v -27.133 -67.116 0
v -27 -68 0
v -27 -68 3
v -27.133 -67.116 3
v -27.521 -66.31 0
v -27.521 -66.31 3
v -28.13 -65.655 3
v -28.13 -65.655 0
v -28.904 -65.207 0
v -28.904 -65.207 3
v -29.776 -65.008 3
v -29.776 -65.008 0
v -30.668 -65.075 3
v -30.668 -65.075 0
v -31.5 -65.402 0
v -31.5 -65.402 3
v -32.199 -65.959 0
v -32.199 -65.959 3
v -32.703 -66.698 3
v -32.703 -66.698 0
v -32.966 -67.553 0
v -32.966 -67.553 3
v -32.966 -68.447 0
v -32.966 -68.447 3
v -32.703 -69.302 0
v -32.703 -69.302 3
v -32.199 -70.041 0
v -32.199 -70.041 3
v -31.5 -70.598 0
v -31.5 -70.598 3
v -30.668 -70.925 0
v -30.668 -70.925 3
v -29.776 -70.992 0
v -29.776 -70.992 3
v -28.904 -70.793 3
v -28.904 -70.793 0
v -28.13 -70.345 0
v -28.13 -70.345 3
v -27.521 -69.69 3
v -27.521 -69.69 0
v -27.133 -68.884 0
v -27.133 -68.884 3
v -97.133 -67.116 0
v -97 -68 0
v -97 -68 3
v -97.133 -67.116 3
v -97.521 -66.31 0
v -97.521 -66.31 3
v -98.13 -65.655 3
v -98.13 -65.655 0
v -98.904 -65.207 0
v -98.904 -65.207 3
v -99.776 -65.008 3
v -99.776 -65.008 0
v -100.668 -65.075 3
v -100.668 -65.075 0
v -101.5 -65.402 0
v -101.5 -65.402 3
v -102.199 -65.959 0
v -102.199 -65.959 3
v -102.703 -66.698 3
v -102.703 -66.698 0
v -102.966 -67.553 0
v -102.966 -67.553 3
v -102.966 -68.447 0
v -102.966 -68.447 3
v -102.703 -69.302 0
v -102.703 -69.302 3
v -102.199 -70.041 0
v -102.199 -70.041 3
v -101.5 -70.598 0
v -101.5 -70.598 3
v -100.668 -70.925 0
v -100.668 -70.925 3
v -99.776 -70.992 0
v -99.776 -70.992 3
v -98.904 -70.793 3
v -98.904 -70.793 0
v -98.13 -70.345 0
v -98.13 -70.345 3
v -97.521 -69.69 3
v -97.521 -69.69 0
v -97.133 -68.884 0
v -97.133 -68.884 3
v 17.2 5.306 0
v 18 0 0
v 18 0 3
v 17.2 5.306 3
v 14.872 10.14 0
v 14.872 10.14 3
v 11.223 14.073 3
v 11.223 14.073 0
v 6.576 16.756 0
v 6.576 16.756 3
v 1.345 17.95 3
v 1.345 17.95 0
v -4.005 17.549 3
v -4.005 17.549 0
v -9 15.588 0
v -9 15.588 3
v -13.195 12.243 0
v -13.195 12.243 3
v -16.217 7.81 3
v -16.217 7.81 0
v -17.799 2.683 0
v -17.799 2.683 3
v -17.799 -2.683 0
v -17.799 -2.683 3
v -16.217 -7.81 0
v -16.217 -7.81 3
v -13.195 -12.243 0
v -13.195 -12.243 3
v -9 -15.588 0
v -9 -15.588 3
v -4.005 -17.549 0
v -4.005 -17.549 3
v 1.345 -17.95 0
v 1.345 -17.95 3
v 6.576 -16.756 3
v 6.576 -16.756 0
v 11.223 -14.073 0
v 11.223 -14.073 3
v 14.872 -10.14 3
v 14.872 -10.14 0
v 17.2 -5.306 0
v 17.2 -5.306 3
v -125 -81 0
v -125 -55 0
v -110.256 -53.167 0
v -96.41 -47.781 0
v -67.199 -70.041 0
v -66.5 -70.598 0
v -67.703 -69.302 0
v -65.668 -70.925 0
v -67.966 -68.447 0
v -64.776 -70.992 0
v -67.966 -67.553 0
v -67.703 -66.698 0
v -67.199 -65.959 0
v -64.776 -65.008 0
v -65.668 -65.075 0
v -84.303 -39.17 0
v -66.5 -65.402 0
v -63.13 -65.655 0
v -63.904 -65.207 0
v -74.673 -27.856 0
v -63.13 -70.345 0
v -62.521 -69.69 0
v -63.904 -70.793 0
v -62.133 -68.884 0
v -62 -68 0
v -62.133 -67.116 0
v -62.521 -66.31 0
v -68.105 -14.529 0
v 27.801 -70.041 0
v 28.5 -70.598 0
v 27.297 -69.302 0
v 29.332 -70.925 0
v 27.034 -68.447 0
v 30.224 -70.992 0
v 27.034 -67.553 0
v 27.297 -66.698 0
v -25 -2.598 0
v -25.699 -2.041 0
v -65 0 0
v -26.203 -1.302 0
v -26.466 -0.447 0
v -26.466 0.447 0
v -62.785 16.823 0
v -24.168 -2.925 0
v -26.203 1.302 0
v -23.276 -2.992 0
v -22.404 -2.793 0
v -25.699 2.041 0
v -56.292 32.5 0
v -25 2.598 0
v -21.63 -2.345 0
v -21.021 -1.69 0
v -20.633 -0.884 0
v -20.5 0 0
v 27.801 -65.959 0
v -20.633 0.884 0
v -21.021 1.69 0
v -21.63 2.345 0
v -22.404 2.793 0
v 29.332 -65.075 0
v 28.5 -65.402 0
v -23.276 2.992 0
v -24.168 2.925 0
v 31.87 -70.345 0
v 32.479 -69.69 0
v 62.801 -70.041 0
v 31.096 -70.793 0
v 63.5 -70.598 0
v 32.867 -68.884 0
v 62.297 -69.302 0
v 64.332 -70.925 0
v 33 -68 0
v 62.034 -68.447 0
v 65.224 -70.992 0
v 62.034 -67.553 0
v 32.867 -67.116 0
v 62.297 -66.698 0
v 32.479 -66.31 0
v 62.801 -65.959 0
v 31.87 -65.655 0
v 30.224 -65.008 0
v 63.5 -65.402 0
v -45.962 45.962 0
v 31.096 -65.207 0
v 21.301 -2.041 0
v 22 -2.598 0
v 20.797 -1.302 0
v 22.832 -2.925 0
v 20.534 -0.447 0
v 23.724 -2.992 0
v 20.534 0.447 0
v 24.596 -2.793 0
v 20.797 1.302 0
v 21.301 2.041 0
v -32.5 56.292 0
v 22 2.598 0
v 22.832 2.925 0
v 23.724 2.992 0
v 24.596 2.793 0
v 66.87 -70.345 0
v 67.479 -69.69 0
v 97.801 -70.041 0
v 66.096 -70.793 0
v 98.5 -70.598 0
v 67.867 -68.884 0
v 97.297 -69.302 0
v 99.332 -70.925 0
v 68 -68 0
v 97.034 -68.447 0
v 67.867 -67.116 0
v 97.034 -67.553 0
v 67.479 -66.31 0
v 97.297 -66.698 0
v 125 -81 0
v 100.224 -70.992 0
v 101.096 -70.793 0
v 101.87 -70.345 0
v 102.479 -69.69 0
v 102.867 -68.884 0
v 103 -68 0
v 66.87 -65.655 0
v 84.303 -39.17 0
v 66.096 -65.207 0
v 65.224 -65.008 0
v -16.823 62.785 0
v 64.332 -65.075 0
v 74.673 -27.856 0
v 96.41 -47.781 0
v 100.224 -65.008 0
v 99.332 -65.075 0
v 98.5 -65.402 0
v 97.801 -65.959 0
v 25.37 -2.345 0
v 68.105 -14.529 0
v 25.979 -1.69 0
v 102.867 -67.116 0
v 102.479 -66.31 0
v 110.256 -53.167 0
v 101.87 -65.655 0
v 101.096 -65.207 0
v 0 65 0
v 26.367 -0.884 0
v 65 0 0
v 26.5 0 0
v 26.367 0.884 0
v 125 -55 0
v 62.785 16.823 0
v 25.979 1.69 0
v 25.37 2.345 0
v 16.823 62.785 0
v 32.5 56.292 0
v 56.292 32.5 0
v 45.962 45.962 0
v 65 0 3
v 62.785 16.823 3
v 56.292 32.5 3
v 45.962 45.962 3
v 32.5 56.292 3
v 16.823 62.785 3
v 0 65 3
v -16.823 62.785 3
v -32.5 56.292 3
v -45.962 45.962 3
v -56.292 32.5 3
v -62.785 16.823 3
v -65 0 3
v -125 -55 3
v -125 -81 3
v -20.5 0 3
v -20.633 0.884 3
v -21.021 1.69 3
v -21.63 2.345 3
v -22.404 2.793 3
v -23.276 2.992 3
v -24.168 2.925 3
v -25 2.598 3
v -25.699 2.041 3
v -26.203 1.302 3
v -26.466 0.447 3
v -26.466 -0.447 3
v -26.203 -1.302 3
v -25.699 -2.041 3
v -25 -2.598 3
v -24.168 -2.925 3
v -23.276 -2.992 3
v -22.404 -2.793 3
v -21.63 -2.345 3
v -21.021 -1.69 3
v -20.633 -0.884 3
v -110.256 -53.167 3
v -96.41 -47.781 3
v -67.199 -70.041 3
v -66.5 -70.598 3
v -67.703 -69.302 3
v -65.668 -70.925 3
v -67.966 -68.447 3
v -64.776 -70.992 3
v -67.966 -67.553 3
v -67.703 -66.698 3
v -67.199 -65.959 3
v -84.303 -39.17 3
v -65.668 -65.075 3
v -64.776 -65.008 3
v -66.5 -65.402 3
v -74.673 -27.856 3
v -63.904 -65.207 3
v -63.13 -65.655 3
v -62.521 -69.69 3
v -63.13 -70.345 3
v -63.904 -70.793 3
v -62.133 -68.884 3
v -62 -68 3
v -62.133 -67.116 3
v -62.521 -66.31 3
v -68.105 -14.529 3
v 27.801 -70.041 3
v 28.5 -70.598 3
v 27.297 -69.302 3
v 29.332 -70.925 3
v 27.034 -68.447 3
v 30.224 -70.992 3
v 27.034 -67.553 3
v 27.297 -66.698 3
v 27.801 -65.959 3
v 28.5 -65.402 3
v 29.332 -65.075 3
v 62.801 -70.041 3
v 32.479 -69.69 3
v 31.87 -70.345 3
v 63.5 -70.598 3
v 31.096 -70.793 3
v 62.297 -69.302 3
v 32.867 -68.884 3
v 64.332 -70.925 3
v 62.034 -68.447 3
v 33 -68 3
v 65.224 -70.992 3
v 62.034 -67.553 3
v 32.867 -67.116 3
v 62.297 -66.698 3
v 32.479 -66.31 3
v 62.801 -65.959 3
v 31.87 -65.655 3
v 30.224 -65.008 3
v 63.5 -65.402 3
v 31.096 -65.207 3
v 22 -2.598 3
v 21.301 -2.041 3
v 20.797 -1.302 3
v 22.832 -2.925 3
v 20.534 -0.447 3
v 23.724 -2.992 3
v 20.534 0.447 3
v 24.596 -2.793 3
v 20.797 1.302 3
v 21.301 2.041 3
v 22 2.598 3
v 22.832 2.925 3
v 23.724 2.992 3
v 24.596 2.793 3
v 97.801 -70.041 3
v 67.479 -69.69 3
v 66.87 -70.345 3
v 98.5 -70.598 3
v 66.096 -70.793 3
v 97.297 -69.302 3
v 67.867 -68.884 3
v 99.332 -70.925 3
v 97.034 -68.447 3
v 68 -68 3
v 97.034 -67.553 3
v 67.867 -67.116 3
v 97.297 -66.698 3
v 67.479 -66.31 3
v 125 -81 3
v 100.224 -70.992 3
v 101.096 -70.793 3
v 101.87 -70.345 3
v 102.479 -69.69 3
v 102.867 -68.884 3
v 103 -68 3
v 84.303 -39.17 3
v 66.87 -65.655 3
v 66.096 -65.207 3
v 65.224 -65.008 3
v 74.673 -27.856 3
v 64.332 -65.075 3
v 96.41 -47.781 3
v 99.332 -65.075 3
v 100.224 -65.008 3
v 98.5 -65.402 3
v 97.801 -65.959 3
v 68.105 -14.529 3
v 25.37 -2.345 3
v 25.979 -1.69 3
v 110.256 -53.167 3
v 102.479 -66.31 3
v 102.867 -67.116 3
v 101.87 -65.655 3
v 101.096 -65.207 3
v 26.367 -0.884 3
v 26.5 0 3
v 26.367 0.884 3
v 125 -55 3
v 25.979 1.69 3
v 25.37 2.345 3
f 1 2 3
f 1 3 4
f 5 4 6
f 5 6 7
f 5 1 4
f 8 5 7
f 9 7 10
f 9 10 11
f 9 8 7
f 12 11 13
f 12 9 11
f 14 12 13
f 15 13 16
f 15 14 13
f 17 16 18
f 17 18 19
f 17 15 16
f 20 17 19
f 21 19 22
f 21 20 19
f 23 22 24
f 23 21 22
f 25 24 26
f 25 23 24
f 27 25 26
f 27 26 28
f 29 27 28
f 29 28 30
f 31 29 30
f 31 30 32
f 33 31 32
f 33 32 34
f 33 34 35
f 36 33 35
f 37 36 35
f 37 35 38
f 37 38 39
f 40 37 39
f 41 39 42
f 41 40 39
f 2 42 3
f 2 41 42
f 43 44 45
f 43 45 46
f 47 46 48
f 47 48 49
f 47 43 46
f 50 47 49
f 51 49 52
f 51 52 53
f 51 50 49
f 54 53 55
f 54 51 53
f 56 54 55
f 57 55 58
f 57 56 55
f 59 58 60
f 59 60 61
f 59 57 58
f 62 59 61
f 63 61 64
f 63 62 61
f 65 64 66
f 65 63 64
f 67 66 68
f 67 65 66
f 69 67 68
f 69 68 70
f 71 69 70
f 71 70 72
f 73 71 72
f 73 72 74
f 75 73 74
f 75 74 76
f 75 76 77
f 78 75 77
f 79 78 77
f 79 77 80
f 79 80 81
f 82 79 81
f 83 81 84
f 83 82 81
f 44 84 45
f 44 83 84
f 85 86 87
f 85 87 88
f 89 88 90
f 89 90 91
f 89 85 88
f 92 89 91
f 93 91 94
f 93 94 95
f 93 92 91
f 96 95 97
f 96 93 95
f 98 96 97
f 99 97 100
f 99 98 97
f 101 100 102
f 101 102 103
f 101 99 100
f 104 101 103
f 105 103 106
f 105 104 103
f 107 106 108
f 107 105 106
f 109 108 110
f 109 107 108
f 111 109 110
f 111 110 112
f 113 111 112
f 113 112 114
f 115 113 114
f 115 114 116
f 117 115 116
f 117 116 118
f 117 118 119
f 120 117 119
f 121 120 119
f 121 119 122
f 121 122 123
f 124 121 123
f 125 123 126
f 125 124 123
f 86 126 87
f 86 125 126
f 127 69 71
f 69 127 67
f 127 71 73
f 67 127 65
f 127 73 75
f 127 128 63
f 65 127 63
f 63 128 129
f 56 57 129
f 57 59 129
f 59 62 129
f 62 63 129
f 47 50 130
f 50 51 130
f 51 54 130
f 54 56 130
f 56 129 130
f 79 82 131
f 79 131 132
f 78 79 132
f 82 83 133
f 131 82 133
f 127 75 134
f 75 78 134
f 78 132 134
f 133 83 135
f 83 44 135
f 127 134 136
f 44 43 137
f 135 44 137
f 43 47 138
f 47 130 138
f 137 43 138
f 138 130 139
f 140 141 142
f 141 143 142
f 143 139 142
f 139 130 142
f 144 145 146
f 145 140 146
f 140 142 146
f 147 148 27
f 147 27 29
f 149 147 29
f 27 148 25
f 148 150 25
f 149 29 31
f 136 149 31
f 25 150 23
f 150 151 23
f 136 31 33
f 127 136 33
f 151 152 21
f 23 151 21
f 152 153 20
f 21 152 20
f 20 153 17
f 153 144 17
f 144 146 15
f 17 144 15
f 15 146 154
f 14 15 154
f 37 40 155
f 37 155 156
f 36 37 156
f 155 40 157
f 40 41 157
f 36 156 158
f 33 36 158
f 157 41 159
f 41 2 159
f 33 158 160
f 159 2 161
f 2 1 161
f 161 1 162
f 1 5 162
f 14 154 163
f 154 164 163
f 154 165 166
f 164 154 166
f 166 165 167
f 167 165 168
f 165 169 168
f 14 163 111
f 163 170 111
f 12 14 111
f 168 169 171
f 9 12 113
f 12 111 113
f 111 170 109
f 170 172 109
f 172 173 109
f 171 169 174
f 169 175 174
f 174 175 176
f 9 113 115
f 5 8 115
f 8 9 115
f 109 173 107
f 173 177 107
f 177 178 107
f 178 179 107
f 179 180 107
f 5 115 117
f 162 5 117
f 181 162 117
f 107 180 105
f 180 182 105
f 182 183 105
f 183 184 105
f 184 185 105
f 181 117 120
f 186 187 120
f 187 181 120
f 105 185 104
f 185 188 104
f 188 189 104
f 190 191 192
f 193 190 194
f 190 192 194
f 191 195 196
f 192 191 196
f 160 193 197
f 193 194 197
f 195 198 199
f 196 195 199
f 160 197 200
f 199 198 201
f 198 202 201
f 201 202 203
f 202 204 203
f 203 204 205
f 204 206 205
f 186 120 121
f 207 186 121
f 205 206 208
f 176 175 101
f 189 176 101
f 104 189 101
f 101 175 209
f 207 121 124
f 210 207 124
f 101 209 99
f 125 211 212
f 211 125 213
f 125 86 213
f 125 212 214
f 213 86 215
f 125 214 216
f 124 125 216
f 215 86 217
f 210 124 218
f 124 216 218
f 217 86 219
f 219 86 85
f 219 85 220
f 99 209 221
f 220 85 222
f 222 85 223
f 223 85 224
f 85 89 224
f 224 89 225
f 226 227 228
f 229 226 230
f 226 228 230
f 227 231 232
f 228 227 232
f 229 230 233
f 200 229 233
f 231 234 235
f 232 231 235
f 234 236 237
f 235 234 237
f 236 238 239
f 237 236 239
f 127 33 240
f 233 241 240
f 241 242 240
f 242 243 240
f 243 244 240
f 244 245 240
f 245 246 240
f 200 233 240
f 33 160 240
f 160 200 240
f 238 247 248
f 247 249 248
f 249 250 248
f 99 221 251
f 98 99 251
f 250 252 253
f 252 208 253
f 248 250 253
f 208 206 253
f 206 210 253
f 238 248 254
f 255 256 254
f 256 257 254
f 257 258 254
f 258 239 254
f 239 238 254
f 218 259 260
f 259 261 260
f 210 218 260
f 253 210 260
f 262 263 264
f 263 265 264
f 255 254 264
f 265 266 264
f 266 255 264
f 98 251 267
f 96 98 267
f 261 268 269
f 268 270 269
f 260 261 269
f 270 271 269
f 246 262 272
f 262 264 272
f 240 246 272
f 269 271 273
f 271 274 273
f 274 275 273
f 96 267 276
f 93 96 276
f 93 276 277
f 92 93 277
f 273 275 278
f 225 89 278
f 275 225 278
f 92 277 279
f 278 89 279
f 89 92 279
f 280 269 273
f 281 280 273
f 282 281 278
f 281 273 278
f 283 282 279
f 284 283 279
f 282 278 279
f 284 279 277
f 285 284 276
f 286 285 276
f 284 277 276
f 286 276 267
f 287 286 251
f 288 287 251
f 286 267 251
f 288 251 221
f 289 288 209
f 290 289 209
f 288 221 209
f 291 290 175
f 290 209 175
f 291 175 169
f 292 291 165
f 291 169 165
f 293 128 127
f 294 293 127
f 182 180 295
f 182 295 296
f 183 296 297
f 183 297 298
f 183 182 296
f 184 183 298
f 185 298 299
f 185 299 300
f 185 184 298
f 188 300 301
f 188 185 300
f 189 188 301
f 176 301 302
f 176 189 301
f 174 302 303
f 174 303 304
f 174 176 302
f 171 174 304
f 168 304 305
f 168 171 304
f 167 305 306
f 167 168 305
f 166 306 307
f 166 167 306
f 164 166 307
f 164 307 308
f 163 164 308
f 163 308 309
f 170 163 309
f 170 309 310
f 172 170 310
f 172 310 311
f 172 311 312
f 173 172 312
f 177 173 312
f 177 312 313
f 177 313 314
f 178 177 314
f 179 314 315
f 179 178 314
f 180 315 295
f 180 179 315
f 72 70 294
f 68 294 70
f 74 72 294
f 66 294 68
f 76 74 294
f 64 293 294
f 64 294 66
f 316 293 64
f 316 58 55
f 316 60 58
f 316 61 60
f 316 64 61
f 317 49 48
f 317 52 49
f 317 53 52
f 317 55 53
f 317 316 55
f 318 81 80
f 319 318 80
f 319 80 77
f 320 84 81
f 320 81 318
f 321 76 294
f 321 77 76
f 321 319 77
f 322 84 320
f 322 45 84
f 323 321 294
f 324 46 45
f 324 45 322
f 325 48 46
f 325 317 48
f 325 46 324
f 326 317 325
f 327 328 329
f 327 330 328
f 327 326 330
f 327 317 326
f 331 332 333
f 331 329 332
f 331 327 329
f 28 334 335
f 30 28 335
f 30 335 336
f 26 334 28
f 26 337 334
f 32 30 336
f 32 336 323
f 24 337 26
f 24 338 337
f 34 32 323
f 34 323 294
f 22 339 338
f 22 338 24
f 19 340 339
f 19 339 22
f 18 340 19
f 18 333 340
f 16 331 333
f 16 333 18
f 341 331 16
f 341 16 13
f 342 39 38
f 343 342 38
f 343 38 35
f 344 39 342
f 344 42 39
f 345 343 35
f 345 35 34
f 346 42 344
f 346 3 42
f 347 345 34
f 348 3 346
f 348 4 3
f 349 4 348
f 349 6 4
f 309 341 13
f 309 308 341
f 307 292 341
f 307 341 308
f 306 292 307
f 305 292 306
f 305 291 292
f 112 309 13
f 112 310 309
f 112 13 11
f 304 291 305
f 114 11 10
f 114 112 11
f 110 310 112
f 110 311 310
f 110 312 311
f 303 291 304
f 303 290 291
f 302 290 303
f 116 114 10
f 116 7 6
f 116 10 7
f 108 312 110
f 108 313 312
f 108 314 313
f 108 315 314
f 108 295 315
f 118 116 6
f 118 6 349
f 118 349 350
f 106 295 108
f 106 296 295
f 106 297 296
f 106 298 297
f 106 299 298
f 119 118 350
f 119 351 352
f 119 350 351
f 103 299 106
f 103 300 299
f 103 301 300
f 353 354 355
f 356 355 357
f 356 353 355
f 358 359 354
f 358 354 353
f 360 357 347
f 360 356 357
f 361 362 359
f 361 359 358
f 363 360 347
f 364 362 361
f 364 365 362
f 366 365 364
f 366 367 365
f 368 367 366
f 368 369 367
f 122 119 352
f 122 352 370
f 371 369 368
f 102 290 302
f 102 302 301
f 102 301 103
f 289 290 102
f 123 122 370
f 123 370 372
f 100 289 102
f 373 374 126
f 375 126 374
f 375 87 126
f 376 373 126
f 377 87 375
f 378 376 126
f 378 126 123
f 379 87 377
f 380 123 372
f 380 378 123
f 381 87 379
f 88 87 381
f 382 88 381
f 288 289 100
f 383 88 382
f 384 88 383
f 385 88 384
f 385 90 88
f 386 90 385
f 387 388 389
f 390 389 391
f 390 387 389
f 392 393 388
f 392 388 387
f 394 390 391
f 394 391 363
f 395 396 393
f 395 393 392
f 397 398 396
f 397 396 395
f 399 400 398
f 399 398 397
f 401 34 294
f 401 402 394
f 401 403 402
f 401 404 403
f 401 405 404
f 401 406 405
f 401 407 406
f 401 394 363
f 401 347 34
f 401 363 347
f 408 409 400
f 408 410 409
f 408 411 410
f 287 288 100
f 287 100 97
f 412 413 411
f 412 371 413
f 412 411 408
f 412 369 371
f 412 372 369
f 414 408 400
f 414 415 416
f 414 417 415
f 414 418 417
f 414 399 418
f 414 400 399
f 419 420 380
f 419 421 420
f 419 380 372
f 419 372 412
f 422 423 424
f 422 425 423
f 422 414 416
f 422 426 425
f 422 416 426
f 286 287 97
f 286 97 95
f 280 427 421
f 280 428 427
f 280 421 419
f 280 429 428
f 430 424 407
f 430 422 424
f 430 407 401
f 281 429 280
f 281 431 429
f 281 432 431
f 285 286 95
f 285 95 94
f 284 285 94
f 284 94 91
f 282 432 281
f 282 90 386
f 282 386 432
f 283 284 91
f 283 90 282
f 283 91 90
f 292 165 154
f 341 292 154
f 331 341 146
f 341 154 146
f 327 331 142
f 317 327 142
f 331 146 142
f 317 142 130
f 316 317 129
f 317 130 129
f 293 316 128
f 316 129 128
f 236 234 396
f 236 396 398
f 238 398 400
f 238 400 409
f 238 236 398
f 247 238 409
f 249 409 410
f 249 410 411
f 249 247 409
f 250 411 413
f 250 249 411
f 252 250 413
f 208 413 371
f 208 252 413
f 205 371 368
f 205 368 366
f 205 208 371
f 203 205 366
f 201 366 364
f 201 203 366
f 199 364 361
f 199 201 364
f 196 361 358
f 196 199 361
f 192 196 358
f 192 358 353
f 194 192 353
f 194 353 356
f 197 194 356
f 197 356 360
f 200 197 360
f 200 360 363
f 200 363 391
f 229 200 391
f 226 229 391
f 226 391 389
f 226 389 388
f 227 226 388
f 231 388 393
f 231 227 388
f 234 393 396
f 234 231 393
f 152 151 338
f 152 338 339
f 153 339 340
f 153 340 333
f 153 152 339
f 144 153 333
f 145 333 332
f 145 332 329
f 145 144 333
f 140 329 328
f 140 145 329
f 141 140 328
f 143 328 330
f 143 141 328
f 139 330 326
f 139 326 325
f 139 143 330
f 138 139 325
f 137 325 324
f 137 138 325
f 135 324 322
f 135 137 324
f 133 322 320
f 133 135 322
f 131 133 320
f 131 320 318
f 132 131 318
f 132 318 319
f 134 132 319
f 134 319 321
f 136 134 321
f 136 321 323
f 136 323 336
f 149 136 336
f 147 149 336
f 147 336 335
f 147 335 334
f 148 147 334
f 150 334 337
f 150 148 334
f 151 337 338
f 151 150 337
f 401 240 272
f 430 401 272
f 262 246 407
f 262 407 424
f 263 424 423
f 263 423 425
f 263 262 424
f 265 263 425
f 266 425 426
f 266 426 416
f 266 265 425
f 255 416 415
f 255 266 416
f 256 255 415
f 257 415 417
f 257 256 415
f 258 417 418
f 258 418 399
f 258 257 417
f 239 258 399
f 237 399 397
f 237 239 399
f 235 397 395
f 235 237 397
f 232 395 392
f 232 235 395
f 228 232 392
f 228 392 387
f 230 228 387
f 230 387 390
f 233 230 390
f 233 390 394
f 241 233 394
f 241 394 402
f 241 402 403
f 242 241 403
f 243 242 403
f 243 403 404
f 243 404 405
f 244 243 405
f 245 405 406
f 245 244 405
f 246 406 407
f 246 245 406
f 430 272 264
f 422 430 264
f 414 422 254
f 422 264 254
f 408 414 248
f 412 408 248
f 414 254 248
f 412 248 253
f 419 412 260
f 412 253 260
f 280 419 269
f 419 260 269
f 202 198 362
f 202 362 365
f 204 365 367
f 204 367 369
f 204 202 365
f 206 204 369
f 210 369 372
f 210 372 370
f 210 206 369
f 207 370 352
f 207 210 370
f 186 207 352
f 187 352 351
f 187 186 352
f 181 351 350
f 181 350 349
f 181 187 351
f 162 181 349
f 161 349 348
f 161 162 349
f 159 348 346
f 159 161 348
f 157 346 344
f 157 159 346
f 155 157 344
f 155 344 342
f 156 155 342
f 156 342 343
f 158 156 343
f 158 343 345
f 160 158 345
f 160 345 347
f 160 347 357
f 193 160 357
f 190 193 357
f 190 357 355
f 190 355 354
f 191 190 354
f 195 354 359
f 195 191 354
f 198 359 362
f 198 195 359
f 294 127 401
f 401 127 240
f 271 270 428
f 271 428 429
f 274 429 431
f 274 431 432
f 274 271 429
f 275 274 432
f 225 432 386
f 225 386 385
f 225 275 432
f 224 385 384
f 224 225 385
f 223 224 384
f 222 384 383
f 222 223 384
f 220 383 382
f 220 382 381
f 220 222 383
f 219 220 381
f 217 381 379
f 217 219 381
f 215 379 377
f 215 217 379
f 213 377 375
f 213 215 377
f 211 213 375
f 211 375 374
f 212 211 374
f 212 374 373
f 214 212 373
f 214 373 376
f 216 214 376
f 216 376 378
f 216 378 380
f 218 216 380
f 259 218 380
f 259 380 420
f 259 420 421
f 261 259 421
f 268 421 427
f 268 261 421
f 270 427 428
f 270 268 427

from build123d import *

# Parameters (mm, degrees)
F0_R     = 3
F0_R_2   = 18
F1_DEPTH = 3


with BuildPart() as f1:
    # F0 (on Top) → F1 (new body)
    with BuildSketch(Plane.XY):
        with BuildLine():
            ThreePointArc((125, -55), (84.302949, -39.169511), (65, 0))
            ThreePointArc((65, 0), (0, 65), (-65, 0))
            ThreePointArc((-65, 0), (-84.302949, -39.169511), (-125, -55))
            Line((-125, -55), (-125, -81))
            Line((-125, -81), (125, -81))
            Line((125, -81), (125, -55))
        make_face()
        with Locations((-100, -68)):
            Circle(F0_R, mode=Mode.SUBTRACT)
        with Locations((-65, -68)):
            Circle(F0_R, mode=Mode.SUBTRACT)
        with Locations((-30, -68)):
            Circle(F0_R, mode=Mode.SUBTRACT)
        with Locations((30, -68)):
            Circle(F0_R, mode=Mode.SUBTRACT)
        with Locations((65, -68)):
            Circle(F0_R, mode=Mode.SUBTRACT)
        with Locations((100, -68)):
            Circle(F0_R, mode=Mode.SUBTRACT)
        with Locations((-23.5, 0)):
            Circle(F0_R, mode=Mode.SUBTRACT)
        Circle(F0_R_2, mode=Mode.SUBTRACT)
        with Locations((23.5, 0)):
            Circle(F0_R, mode=Mode.SUBTRACT)
    extrude(amount=F1_DEPTH)


solid = f1.part
